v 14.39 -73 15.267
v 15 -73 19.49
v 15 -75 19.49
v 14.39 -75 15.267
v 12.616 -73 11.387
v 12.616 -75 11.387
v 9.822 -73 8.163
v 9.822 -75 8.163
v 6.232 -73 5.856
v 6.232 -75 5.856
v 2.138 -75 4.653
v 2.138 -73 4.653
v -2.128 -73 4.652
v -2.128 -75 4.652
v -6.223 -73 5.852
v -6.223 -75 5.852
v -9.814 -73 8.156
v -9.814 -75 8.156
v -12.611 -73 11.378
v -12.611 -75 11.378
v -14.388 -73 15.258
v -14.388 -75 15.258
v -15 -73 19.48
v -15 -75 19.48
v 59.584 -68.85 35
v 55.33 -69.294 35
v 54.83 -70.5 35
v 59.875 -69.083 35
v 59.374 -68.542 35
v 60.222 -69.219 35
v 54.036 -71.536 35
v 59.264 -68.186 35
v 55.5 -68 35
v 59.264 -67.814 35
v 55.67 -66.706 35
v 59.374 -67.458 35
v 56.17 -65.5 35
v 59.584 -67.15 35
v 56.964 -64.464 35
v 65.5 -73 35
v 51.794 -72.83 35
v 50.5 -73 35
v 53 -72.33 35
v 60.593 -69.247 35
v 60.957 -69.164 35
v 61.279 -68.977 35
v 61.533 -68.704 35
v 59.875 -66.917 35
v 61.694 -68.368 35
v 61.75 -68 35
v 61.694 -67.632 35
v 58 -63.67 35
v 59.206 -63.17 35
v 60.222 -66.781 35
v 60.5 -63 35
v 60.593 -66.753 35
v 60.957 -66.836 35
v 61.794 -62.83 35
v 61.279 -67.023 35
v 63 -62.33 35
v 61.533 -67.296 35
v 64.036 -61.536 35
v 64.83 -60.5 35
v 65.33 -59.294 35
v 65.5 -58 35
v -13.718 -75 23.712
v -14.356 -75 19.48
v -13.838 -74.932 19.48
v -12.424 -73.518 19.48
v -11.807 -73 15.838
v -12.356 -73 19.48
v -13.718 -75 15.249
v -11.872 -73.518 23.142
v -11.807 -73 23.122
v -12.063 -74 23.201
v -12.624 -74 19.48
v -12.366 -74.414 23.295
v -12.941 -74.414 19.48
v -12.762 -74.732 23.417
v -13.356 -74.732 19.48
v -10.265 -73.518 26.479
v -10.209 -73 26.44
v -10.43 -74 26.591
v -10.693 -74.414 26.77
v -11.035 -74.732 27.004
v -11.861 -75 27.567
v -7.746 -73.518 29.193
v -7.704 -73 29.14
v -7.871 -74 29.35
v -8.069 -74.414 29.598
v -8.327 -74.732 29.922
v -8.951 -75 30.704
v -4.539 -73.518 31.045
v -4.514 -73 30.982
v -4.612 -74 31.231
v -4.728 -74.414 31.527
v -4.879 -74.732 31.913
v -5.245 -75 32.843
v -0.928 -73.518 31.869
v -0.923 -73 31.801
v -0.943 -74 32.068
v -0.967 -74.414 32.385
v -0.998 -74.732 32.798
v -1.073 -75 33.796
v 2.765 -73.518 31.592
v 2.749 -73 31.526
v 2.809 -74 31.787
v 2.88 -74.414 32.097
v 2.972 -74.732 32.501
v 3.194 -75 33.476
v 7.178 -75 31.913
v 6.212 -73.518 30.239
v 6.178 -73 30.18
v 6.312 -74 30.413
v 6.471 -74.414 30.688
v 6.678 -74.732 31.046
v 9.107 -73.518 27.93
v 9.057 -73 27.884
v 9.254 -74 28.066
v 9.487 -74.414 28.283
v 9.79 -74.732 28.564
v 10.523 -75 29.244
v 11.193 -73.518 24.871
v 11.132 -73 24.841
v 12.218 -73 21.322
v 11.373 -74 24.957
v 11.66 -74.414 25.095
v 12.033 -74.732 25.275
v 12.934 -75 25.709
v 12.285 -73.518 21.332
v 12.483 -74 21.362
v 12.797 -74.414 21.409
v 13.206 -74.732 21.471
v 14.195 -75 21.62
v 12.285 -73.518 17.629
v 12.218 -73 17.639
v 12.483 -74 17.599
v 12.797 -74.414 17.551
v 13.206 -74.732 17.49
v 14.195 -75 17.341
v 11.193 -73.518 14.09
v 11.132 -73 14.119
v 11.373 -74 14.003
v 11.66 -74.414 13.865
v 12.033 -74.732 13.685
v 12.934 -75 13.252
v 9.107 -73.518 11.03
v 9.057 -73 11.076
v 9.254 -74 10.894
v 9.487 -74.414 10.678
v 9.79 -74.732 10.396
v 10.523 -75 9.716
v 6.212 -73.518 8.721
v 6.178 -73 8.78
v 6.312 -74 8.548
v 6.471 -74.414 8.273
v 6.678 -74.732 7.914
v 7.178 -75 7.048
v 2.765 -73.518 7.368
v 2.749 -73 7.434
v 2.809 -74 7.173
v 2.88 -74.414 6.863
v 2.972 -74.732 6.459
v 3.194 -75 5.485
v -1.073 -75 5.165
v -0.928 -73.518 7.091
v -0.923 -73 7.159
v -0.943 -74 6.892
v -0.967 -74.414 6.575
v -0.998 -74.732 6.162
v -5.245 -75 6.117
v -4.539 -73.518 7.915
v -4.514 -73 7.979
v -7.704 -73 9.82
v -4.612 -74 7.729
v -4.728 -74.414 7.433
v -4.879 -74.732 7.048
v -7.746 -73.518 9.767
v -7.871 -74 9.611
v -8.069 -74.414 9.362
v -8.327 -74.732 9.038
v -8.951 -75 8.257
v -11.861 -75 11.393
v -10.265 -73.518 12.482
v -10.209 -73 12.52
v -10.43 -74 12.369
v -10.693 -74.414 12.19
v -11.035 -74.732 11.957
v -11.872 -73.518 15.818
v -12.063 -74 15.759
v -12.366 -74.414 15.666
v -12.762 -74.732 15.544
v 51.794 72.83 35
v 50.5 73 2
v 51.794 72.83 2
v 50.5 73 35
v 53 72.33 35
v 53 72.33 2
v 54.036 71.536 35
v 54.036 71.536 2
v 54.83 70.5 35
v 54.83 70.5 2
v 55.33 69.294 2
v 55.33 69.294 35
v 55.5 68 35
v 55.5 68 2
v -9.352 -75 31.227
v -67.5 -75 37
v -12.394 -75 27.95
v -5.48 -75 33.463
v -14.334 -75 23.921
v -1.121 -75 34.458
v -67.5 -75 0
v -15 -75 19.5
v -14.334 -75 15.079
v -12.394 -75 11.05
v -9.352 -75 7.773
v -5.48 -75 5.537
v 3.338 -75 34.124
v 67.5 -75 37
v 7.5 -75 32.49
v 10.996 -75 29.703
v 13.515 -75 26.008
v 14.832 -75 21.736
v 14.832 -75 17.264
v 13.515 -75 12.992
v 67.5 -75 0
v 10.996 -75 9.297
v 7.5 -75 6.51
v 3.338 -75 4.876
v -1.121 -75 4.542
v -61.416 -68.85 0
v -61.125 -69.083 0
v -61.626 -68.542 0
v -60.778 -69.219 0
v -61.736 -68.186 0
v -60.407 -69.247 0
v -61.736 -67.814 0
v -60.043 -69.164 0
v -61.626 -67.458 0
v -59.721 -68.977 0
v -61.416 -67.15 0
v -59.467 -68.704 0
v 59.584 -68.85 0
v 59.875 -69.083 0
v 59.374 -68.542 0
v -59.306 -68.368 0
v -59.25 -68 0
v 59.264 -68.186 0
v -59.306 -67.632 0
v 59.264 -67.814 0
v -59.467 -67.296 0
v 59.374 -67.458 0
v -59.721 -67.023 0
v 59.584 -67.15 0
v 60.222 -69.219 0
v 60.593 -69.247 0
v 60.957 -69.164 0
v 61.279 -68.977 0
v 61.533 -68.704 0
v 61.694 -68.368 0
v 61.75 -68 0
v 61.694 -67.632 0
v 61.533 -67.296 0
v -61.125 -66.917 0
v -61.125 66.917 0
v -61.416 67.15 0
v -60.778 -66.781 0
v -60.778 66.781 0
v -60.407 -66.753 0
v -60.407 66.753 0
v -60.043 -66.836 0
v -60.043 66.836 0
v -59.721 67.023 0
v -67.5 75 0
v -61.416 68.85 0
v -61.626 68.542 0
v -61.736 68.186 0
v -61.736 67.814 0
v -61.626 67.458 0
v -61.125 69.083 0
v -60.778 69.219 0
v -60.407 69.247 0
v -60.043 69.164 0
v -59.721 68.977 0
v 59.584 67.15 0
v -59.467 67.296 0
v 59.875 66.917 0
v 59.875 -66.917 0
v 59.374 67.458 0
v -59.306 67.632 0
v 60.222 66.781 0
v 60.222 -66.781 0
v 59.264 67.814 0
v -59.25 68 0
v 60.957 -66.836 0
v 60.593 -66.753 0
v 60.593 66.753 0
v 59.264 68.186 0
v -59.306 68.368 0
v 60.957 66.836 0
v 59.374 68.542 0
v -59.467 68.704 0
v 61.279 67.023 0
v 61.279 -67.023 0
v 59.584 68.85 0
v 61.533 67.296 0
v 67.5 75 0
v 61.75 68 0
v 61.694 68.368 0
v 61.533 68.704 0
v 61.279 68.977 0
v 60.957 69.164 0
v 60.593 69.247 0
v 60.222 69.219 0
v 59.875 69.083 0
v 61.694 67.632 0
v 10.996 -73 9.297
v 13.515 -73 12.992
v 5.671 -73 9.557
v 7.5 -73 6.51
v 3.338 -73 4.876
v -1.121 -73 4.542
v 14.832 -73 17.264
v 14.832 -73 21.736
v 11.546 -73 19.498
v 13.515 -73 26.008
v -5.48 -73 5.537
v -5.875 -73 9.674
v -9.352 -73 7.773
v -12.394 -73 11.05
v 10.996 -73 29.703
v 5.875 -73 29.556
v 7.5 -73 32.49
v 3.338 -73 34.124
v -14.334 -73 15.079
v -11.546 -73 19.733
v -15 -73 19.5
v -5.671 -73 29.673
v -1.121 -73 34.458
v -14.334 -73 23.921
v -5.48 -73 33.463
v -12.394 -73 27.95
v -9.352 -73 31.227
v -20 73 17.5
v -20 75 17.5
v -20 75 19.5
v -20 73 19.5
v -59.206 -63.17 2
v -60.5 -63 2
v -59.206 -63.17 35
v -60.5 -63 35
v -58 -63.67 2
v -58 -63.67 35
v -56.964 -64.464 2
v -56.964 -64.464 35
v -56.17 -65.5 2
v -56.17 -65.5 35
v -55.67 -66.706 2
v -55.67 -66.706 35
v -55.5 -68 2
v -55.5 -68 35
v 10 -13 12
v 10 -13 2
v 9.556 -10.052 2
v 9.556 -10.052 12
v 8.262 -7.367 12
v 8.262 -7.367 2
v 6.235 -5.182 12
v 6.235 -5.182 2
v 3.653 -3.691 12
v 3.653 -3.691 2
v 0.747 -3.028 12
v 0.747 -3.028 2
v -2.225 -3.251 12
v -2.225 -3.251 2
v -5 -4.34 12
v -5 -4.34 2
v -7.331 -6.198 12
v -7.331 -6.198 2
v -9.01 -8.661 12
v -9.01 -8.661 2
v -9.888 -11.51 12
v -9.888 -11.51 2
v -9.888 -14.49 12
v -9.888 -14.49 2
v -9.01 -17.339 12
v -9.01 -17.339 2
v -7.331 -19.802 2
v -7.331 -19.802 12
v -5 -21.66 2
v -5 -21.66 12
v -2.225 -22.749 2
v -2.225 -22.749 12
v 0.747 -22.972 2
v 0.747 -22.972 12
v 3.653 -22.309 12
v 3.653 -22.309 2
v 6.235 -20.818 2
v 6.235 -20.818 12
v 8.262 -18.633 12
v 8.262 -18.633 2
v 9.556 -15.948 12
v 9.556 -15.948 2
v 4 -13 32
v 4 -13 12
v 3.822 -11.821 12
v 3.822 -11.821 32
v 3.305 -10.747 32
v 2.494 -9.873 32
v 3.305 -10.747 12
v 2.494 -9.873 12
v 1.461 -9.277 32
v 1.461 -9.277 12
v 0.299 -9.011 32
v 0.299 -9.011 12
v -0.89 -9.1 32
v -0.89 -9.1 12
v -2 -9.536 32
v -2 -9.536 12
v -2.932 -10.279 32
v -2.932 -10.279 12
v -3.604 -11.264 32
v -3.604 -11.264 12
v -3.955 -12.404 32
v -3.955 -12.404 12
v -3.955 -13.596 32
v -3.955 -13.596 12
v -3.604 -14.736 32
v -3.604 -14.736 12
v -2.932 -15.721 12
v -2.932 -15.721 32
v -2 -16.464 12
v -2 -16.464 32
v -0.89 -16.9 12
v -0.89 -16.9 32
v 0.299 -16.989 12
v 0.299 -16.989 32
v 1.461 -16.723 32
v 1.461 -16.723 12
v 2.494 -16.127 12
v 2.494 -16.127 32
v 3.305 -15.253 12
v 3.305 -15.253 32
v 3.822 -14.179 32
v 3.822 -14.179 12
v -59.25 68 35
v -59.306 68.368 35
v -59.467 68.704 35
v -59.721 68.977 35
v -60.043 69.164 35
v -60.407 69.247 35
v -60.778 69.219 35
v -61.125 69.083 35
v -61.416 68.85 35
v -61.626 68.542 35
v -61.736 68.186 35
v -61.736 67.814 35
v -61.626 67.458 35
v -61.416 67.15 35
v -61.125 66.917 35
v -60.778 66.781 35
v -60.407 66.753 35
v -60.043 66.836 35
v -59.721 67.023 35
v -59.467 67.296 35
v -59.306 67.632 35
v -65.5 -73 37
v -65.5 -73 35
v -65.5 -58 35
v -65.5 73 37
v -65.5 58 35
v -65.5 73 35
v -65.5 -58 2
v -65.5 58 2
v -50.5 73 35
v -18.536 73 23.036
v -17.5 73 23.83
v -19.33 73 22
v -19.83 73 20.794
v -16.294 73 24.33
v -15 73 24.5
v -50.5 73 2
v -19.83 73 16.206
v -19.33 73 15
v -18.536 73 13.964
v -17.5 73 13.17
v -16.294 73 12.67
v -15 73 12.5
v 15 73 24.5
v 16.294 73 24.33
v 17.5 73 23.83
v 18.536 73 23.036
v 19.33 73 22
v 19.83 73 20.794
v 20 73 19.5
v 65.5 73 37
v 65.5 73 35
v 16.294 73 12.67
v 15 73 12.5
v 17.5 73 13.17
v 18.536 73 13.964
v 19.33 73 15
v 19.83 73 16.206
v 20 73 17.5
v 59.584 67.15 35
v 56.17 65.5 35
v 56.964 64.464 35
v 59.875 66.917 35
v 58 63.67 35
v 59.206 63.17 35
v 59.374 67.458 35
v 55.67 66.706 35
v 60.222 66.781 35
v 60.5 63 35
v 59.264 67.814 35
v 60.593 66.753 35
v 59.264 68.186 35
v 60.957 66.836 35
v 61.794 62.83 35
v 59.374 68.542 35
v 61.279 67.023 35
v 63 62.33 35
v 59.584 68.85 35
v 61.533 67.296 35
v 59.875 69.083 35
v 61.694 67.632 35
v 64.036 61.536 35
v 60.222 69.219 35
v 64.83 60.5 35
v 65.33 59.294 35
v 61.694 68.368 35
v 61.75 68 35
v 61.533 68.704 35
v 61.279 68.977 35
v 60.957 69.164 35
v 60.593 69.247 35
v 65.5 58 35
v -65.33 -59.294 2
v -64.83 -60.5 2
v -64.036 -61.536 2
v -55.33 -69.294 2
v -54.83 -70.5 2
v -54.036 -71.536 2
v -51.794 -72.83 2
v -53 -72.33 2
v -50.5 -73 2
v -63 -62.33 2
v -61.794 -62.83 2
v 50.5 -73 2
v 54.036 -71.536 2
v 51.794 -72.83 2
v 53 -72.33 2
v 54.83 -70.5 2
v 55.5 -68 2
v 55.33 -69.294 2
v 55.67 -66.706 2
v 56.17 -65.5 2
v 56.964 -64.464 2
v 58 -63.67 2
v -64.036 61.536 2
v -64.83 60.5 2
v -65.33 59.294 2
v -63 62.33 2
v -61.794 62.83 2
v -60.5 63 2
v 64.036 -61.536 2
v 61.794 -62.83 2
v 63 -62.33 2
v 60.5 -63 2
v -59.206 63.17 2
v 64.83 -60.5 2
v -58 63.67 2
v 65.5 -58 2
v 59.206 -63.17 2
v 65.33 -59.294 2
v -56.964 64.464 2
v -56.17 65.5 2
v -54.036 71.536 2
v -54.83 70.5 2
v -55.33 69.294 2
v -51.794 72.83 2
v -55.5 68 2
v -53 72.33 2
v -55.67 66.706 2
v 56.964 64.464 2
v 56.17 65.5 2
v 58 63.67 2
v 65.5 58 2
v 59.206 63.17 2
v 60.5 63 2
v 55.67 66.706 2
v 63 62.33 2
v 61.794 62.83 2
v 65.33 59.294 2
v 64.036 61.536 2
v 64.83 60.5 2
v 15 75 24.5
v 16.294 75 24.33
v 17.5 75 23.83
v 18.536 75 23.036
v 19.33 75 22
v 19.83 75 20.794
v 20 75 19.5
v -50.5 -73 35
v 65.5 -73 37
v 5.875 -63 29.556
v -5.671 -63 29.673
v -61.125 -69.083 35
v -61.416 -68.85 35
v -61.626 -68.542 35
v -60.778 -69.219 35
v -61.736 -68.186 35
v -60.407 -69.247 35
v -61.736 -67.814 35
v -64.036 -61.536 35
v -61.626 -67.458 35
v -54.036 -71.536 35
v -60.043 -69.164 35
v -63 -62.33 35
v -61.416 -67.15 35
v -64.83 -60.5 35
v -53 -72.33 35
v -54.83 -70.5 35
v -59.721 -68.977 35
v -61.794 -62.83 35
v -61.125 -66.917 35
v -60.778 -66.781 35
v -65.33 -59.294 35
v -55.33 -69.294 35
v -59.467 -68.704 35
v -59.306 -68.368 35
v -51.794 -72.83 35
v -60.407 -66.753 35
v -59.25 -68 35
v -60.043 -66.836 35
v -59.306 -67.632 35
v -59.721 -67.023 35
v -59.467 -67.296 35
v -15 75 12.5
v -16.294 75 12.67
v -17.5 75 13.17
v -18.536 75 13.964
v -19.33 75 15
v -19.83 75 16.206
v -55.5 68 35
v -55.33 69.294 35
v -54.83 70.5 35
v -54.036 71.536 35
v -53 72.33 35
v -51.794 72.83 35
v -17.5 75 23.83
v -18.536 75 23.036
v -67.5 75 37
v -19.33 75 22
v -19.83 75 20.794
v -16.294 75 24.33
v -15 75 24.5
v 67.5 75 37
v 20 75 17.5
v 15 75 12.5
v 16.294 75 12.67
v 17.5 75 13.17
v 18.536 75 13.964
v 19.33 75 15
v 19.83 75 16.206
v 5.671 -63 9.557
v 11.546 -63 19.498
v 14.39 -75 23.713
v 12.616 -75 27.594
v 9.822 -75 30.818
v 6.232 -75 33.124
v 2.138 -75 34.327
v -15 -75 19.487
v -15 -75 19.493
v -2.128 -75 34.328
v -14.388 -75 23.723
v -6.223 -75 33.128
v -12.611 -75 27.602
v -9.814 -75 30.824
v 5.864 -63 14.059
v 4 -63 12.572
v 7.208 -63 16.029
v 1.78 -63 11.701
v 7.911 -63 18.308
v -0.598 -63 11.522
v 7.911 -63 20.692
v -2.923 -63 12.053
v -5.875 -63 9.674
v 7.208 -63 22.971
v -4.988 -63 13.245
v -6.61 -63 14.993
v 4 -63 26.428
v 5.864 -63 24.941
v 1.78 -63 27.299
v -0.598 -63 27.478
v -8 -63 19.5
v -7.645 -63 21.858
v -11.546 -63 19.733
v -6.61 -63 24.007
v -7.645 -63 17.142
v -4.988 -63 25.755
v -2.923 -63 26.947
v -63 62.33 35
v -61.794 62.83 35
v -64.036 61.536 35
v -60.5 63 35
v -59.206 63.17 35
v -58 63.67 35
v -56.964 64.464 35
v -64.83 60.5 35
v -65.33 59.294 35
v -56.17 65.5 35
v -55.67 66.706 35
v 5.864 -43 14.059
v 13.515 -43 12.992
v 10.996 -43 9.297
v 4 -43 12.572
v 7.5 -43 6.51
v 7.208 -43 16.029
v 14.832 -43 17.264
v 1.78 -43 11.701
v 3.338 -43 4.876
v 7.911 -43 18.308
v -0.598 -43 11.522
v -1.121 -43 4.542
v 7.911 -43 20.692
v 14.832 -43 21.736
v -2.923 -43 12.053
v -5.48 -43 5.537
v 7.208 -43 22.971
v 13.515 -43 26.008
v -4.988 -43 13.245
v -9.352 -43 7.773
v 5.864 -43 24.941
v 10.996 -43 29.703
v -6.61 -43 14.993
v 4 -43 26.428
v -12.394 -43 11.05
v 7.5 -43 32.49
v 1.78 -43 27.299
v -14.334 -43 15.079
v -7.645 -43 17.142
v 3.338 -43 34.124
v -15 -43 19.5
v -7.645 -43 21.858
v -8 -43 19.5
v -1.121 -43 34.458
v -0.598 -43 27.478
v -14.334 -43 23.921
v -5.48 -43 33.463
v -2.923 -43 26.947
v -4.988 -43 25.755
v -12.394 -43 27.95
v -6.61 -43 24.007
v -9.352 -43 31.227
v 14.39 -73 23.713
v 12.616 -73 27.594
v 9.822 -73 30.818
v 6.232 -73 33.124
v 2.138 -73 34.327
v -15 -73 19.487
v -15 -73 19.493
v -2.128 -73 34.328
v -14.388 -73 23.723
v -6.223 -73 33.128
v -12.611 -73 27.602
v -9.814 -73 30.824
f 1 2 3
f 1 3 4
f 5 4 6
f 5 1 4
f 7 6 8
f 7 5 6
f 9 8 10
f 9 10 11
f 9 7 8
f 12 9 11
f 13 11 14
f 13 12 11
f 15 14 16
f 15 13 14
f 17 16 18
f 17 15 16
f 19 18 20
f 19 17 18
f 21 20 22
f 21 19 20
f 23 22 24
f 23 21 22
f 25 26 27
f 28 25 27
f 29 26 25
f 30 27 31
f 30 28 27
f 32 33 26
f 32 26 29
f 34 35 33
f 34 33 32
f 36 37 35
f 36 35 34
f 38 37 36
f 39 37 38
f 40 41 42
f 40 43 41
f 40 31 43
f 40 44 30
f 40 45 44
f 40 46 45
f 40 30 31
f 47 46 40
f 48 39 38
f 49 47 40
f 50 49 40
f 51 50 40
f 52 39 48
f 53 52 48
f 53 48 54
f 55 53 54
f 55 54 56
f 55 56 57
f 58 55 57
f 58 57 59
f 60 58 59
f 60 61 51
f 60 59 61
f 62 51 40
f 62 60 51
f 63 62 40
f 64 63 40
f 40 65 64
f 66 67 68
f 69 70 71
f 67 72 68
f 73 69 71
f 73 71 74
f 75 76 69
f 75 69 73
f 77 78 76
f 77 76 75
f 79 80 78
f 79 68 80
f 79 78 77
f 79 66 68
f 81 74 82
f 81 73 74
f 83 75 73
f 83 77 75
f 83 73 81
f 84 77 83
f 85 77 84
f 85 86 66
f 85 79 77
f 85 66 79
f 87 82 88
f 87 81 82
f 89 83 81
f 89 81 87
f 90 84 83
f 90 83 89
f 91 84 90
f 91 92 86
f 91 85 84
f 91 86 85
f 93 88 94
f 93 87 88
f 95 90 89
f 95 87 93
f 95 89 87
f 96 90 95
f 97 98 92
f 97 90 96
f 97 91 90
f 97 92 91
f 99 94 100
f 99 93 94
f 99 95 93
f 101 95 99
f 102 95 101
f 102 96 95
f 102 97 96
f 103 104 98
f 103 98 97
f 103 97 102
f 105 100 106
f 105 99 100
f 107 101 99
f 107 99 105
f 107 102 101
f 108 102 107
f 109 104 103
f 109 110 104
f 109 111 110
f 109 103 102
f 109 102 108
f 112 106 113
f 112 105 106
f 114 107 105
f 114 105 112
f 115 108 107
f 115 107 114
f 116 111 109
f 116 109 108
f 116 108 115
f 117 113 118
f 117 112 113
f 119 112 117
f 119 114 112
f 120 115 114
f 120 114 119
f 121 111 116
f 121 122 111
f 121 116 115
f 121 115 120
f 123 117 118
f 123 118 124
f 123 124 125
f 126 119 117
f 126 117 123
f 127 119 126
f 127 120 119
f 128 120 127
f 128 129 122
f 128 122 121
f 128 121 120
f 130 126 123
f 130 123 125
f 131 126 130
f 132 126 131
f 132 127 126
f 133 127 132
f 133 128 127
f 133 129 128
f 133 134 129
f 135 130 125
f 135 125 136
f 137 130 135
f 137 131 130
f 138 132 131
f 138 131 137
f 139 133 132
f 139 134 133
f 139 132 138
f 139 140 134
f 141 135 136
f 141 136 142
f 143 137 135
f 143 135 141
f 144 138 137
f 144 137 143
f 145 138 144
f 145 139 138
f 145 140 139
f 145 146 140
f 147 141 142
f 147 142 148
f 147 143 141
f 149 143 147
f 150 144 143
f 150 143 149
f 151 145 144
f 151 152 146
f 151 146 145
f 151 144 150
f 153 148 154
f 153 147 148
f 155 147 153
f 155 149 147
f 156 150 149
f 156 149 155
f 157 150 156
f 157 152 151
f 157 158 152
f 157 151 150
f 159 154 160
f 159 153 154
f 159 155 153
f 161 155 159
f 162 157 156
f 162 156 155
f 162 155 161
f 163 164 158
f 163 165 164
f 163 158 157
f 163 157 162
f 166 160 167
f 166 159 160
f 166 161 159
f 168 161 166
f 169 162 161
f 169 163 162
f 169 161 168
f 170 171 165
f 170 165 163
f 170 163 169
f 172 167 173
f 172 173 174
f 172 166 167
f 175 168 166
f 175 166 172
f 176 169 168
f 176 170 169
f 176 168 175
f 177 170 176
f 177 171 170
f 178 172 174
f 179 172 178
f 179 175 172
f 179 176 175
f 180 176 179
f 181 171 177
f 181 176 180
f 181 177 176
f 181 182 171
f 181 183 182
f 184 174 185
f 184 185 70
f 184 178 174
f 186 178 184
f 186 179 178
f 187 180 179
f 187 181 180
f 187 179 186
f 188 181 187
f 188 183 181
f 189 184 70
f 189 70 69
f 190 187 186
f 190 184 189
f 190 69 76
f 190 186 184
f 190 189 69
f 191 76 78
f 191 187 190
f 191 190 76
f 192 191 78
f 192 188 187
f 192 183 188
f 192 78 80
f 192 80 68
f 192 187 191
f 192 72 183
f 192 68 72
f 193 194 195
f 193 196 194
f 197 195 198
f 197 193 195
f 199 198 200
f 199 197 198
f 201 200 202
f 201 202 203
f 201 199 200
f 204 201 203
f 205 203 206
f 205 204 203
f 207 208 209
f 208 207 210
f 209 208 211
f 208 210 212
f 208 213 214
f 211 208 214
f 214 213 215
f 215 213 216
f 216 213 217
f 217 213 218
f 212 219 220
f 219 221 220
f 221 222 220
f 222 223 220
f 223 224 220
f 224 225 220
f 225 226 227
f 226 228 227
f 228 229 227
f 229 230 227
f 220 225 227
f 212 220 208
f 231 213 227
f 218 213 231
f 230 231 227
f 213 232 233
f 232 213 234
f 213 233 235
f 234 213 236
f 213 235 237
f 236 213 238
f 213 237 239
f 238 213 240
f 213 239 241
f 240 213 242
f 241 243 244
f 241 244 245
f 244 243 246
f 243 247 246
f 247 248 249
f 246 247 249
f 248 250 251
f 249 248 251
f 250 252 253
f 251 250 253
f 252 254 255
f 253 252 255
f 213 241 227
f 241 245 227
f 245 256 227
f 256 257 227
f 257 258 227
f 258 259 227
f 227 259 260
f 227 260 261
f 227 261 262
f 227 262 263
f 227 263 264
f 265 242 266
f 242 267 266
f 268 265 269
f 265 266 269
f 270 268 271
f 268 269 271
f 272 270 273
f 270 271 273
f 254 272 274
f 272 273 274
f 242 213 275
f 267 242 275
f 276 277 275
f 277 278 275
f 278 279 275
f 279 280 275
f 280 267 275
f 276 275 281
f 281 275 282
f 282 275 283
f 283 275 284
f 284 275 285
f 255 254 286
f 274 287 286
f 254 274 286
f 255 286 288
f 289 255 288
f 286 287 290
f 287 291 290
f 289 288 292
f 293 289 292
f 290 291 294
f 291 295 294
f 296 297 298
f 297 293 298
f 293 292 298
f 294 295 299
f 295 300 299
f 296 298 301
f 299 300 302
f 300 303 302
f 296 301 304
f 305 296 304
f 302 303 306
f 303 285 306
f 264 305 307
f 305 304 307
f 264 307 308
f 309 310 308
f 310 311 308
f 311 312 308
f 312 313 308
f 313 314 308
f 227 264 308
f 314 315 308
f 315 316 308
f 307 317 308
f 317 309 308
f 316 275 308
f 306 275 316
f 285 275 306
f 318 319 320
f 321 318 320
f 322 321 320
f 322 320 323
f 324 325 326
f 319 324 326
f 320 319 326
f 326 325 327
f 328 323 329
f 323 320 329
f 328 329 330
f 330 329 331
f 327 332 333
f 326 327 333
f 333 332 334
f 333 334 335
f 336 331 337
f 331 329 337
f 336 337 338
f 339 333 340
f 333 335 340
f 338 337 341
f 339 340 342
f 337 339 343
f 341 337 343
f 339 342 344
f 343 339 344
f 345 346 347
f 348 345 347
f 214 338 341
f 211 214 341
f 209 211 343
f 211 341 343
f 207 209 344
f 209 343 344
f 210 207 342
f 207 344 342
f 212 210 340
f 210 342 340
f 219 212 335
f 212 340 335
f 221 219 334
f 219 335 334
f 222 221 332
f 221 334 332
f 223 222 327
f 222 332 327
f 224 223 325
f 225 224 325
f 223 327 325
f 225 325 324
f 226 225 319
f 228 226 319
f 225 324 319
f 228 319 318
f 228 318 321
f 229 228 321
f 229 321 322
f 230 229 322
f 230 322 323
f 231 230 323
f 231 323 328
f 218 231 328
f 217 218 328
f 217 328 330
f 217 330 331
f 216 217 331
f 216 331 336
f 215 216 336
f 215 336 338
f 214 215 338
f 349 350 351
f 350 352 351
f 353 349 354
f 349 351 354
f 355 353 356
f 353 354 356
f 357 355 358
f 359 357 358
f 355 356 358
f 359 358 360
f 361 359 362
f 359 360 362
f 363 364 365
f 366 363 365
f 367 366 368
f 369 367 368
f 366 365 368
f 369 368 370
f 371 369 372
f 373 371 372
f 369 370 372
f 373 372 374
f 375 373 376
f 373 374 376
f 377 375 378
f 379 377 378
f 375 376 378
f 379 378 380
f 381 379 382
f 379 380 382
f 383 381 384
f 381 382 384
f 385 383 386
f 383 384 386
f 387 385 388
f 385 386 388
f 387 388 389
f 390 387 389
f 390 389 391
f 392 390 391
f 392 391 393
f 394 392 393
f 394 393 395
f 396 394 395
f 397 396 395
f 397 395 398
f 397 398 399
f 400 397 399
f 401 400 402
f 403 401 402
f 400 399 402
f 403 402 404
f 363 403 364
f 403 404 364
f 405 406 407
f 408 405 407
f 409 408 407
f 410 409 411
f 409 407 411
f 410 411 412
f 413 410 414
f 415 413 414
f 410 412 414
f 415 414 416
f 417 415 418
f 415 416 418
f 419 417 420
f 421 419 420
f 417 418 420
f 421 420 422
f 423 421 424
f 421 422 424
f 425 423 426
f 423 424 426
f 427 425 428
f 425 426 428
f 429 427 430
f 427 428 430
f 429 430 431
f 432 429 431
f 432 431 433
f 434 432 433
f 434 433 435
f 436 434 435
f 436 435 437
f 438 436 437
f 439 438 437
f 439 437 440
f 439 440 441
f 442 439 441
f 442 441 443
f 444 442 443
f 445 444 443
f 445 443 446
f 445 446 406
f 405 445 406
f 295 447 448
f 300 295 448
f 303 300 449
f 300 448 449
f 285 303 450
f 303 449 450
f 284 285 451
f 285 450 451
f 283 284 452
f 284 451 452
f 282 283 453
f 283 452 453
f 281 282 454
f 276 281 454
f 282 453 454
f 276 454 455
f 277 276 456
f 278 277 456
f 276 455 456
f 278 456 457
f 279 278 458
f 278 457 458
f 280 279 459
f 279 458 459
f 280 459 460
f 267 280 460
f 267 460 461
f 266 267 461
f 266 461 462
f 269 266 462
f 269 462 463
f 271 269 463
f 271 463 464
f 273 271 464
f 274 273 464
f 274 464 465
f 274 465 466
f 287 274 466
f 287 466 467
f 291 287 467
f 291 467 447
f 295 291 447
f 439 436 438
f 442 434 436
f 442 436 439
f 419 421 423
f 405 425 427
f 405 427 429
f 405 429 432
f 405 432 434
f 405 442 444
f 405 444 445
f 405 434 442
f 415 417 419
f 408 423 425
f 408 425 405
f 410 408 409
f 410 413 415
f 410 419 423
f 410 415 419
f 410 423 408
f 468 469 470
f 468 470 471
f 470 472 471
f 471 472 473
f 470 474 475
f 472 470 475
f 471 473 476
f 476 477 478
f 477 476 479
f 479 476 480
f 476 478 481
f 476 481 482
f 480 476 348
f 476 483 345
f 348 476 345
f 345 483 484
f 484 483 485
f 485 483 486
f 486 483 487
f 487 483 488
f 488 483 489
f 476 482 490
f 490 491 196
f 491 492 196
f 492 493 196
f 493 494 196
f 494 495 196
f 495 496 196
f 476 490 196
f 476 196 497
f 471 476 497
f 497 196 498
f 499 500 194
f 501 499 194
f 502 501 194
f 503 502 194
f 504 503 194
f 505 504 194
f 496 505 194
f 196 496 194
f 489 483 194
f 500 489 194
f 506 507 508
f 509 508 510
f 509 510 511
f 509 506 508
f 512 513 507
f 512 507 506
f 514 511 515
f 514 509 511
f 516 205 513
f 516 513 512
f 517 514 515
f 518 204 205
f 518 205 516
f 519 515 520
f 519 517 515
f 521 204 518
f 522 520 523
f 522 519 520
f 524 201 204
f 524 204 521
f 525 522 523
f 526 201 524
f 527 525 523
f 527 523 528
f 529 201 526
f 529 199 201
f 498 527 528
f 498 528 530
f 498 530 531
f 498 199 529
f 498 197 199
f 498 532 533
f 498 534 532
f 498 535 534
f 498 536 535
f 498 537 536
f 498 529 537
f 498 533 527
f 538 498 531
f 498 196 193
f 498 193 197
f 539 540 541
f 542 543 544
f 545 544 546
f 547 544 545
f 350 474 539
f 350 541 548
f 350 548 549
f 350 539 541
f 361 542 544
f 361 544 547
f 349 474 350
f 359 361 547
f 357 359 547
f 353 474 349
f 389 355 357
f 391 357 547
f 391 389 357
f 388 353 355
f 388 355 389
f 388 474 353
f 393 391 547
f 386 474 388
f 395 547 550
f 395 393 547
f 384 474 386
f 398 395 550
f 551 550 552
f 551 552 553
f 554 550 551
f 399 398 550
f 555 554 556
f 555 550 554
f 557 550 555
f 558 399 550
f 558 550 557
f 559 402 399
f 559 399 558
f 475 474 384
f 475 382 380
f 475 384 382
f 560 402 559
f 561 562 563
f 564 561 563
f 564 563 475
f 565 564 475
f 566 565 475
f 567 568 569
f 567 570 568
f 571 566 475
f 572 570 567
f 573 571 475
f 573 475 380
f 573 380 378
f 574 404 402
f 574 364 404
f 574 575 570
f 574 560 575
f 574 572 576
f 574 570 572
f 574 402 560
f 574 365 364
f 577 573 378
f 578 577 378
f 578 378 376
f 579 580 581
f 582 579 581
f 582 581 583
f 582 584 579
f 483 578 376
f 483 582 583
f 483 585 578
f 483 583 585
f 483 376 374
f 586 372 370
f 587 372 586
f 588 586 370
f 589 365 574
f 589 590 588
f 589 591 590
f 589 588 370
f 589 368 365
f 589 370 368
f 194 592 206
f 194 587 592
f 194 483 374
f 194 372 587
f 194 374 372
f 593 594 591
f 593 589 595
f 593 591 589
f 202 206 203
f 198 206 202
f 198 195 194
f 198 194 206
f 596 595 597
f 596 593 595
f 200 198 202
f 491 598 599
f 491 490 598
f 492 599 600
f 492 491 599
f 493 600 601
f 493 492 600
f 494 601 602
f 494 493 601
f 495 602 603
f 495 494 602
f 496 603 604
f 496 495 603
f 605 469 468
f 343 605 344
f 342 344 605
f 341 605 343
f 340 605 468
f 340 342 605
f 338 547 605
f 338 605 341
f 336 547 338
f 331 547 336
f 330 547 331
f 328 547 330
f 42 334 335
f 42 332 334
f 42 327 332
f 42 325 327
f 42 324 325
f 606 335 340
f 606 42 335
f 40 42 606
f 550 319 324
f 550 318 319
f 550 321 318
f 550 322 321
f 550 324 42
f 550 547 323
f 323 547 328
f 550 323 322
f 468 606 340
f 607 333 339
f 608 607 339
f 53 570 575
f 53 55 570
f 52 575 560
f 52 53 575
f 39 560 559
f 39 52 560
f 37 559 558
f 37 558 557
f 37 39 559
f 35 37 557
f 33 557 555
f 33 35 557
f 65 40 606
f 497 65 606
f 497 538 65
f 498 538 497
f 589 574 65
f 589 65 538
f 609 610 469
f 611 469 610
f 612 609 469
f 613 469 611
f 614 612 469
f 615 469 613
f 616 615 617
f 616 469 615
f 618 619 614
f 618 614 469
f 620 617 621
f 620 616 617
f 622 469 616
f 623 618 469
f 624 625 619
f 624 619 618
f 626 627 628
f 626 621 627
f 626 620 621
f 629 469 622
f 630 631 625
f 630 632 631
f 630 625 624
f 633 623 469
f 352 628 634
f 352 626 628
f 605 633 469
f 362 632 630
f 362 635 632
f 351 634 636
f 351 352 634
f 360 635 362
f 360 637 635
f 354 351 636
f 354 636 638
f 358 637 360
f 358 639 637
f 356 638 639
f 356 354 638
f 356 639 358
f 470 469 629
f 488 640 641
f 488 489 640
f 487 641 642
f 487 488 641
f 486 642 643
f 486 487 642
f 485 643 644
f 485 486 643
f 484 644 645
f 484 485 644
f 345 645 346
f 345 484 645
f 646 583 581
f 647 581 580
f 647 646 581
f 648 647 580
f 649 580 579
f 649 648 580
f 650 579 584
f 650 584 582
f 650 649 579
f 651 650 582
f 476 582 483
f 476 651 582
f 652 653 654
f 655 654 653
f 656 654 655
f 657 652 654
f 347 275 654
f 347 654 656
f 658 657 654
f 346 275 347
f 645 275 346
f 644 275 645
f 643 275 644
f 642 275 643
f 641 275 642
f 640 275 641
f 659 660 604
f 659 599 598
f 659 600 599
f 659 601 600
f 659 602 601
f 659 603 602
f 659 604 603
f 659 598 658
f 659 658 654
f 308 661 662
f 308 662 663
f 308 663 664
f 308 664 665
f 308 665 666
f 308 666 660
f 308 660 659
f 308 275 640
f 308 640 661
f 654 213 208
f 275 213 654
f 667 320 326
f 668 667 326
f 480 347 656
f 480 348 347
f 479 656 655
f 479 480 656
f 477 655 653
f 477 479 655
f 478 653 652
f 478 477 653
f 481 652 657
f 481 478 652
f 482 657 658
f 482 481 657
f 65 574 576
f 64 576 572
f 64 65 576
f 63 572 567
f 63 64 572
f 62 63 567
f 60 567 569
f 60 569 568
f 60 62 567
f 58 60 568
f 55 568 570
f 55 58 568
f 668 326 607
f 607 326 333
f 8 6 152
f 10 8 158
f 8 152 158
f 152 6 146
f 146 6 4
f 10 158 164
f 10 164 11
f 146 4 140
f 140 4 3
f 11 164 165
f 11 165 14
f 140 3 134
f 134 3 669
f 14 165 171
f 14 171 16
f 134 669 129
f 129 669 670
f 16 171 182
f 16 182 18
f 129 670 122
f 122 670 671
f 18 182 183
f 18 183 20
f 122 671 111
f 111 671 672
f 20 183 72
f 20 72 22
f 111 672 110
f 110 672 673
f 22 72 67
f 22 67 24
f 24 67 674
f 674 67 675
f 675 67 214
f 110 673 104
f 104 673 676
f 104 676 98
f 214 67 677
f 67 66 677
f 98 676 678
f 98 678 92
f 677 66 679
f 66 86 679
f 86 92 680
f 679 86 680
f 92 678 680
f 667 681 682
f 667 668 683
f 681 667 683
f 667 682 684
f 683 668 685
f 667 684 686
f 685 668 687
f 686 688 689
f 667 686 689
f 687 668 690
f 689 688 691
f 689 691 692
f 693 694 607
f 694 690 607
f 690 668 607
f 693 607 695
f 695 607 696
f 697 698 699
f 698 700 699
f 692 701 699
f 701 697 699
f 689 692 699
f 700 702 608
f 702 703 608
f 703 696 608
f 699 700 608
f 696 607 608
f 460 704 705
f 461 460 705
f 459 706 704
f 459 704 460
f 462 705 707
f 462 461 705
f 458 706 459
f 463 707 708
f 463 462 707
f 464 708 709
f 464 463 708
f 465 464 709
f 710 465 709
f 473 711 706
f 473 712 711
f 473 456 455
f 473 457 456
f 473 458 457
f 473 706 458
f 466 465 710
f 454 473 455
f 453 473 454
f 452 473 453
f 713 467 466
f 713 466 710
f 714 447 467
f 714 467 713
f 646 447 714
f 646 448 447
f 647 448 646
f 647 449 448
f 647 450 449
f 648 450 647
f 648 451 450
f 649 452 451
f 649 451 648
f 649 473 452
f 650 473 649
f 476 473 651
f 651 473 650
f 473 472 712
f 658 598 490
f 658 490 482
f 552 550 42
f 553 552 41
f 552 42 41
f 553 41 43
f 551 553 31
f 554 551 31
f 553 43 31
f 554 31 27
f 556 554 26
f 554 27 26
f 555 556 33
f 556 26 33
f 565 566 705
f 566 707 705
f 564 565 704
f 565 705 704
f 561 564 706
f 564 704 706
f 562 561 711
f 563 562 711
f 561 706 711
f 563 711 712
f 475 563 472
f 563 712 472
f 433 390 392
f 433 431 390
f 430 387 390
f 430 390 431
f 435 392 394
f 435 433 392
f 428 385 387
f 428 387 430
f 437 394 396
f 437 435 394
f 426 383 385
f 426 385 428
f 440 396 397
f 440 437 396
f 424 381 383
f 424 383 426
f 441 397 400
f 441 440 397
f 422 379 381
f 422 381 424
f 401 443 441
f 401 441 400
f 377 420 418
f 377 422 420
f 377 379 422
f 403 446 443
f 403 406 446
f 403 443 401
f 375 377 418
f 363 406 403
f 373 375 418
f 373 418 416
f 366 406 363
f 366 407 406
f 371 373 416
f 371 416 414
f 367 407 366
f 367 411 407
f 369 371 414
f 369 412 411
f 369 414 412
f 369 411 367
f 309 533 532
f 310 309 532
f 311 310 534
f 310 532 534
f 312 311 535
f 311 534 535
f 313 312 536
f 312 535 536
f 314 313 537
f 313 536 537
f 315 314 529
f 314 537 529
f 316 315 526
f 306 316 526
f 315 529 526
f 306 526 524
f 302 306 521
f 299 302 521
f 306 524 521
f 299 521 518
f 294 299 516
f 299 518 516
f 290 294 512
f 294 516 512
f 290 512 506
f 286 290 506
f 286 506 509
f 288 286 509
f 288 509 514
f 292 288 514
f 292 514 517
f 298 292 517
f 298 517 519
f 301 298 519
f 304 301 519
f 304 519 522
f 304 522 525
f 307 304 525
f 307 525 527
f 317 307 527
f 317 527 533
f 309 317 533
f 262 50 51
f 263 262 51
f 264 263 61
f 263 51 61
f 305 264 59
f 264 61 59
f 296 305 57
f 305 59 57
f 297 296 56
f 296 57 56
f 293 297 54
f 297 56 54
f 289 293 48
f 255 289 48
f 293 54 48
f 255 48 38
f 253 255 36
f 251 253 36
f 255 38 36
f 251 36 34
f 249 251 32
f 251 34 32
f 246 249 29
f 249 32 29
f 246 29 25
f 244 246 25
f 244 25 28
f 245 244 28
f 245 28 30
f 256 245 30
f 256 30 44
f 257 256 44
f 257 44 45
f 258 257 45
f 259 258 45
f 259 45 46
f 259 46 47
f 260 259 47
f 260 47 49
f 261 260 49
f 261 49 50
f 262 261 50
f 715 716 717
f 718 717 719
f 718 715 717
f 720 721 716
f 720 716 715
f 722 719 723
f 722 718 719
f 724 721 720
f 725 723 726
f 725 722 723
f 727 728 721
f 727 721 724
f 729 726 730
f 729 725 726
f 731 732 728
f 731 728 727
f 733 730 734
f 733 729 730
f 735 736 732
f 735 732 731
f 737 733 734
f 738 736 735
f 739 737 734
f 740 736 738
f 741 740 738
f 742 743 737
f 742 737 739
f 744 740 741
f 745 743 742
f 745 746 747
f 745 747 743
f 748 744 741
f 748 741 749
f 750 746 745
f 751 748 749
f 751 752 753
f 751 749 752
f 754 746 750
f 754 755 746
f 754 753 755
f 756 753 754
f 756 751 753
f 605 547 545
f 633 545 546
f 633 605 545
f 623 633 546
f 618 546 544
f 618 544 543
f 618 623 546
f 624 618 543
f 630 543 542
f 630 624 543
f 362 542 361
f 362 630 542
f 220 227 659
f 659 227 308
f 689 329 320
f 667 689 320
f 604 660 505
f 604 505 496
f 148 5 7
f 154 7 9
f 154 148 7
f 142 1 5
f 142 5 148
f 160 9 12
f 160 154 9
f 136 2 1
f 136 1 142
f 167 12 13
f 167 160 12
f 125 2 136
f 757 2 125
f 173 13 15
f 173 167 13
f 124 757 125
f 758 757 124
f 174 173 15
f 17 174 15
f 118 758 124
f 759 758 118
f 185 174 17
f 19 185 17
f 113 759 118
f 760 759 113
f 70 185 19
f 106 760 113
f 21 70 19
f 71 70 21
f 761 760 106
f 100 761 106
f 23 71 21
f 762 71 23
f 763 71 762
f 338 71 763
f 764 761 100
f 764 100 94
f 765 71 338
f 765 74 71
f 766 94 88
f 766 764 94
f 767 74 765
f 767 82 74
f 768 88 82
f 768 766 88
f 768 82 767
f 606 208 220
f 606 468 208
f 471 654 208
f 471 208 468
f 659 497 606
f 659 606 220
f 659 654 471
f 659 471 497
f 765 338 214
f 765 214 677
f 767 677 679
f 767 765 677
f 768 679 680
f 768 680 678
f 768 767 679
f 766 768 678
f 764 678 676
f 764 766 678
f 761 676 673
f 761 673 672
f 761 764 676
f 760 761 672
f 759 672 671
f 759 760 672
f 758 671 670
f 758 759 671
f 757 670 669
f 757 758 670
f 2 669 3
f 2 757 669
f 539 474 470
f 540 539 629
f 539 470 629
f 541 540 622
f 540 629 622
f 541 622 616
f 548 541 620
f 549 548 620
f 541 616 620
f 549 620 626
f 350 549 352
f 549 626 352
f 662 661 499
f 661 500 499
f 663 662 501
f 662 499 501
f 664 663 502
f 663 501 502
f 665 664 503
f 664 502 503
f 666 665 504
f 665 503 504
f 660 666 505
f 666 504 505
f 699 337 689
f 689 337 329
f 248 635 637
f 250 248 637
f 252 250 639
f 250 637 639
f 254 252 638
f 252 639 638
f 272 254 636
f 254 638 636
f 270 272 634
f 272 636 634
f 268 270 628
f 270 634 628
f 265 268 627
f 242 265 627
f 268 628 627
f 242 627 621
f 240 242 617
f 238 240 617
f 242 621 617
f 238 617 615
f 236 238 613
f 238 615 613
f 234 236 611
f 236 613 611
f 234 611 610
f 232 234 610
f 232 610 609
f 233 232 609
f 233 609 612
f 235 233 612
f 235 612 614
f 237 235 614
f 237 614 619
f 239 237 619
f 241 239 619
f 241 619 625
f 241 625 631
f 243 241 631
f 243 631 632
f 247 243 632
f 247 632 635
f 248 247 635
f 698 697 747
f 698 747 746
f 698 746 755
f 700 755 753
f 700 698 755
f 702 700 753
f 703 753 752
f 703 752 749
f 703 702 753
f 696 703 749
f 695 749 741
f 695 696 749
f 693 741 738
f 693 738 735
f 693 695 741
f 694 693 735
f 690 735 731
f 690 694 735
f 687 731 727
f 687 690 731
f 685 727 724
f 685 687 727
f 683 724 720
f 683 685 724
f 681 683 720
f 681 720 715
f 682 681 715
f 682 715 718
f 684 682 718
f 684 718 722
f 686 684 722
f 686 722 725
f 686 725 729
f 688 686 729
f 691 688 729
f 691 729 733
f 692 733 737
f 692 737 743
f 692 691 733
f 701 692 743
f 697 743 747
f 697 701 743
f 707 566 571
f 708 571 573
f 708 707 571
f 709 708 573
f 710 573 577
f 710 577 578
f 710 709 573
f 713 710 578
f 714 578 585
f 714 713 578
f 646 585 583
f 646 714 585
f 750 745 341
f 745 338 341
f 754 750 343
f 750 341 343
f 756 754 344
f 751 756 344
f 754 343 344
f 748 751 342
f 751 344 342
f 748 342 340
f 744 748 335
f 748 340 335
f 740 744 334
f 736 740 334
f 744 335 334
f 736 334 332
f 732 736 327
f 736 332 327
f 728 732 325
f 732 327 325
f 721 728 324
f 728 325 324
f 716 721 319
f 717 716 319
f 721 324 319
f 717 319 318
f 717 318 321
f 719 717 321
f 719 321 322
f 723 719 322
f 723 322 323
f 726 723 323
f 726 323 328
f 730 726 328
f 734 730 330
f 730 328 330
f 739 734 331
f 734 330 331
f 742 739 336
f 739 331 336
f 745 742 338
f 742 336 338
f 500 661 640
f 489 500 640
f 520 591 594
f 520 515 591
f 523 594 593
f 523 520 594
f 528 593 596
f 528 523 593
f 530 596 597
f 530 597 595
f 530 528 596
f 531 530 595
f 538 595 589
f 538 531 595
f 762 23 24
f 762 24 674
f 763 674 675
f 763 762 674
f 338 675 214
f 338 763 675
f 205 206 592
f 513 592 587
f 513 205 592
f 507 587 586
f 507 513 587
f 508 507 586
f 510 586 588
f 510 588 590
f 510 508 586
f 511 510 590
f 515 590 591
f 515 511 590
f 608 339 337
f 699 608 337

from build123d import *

# Parameters (mm, degrees)
F0_W      = 135
F0_H      = 150
F1_DEPTH  = 2
F2_W      = 135
F2_H      = 150
F2_W_2    = 131
F2_H_2    = 146
F3_DEPTH  = 35
F4_R      = 4
F5_DEPTH  = 30
F6_R      = 10
F6_R_2    = 4
F7_DEPTH  = 10
F9_R      = 15
F10_DEPTH = 10
F8_R      = 15
F12_DEPTH = 5
F13_R     = 15
F13_R_2   = 8
F14_DEPTH = 20
F15_W     = 40
F15_H     = 12
F16_DEPTH = 2
F17_R     = 5
F18_W     = 10
F18_H     = 10
F19_DEPTH = 33
F20_R     = 1.25
F21_DEPTH = 35.001
F22_R     = 4.99999
F23_R     = 12.3556147712
F24_DEPTH = 2
F25_R     = 1.99999


# Not quite as in the source:
# - a fillet or chamfer is up to 0.001 mm smaller than in the source, because OpenCascade refuses the exact size
# - ends of sketch curves that miss each other by under 0.0002 mm in the source are joined
# - a feature of the source that left no trace in its solid (it failed there, or was rolled back) is left out


with BuildPart() as f1:
    # F0 (on Top) → F1 (new body)
    with BuildSketch(Plane.XY):
        Rectangle(F0_W, F0_H)
    extrude(amount=F1_DEPTH)

    # F2 (on face) → F3 (join)
    with BuildSketch(Plane.XY.offset(2)):
        Rectangle(F2_W, F2_H)
        Rectangle(F2_W_2, F2_H_2, mode=Mode.SUBTRACT)
    extrude(amount=F3_DEPTH)

    # F4 (on face) → F5 (join)
    with BuildSketch(Plane.XY.offset(2)):
        with Locations((0, -13)):
            Circle(F4_R)
    extrude(amount=F5_DEPTH)

    # F6 (on face) → F7 (join)
    with BuildSketch(Plane.XY.offset(2)):
        with Locations((0, -13)):
            Circle(F6_R)
        with Locations((0, -13)):
            Circle(F6_R_2, mode=Mode.SUBTRACT)
    extrude(amount=F7_DEPTH)

    # F8 (on face) → F12 (cut)
    with BuildSketch(Plane(origin=(0, -73, 0), x_dir=(-1, 0, 0), z_dir=(0, 1, 0))):
        with Locations((0, 19.5)):
            Circle(F8_R)
    extrude(amount=-F12_DEPTH, mode=Mode.SUBTRACT)

    # F15 (on face) → F16 (cut)
    with BuildSketch(Plane(origin=(0, 75, 0), x_dir=(-1, 0, 0), z_dir=(0, 1, 0))):
        with Locations((0, 18.5)):
            Rectangle(F15_W, F15_H)
    extrude(amount=-F16_DEPTH, mode=Mode.SUBTRACT)

    # F17
    f17_edges = [f1.edges().sort_by_distance(p)[0] for p in [
        (-20, 74, 12.5),
        (20, 74, 12.5),
        (-20, 74, 24.5),
        (20, 74, 24.5),
    ]]
    fillet(f17_edges, radius=F17_R)

    # F18 (on face) → F19 (join)
    with BuildSketch(Plane.XY.offset(2)):
        with Locations((-60.5, 68)):
            Rectangle(F18_W, F18_H)
        with Locations((60.5, 68)):
            Rectangle(F18_W, F18_H)
        with Locations((60.5, -68)):
            Rectangle(F18_W, F18_H)
        with Locations((-60.5, -68)):
            Rectangle(F18_W, F18_H)
    extrude(amount=F19_DEPTH)

    # F20 (on face) → F21 (cut, through all)
    with BuildSketch(Plane.XY.offset(35)):
        with Locations((-60.5, 68)):
            Circle(F20_R)
        with Locations((60.5, 68)):
            Circle(F20_R)
        with Locations((60.5, -68)):
            Circle(F20_R)
        with Locations((-60.5, -68)):
            Circle(F20_R)
    extrude(amount=-F21_DEPTH, mode=Mode.SUBTRACT)

    # F22 (radius 5 in the source; OpenCascade refuses exactly that, so slightly less here)
    f22_edges = [f1.edges().sort_by_distance(p)[0] for p in [
        (-55.5, 73, 18.5),
        (-55.5, 63, 18.5),
        (-65.5, 63, 18.5),
        (55.5, 73, 18.5),
        (55.5, 63, 18.5),
        (65.5, 63, 18.5),
        (65.5, -63, 18.5),
        (55.5, -63, 18.5),
        (55.5, -73, 18.5),
        (-65.5, -63, 18.5),
        (-55.5, -63, 18.5),
        (-55.5, -73, 18.5),
    ]]
    fillet(f22_edges, radius=F22_R)


with BuildPart() as f10:
    # F9 (on face) → F10 (new body)
    with BuildSketch(Plane(origin=(0, -73, 0), x_dir=(-1, 0, 0), z_dir=(0, 1, 0))):
        with Locations((0, 19.5)):
            Circle(F9_R)
        Polygon((5.6714946114, 29.6733575716), (11.5464081104, 19.7325968002), (5.874913499, 9.6743920794), (-5.6714946114, 9.5569481299), (-11.5464081104, 19.4977089013), (-5.874913499, 29.5559136221), align=None, mode=Mode.SUBTRACT)
    extrude(amount=F10_DEPTH)

    # F13 (on face) → F14 (join)
    with BuildSketch(Plane(origin=(0, -63, 0), x_dir=(-1, 0, 0), z_dir=(0, 1, 0))):
        with Locations((0, 19.5)):
            Circle(F13_R)
        Polygon((-5.874913499, 29.5559136221), (5.6714946114, 29.6733575716), (11.5464081104, 19.7325968002), (5.874913499, 9.6743920794), (-5.6714946114, 9.5569481299), (-11.5464081104, 19.4977089013), align=None, mode=Mode.SUBTRACT)
        Polygon((11.5464081104, 19.7325968002), (5.6714946114, 29.6733575716), (-5.874913499, 29.5559136221), (-11.5464081104, 19.4977089013), (-5.6714946114, 9.5569481299), (5.874913499, 9.6743920794), align=None)
        with Locations((0, 19.5)):
            Circle(F13_R_2, mode=Mode.SUBTRACT)
    extrude(amount=F14_DEPTH)


with BuildPart() as f24:
    # F23 (on face) → F24 (new body)
    with BuildSketch(Plane(origin=(0, -73, 0), x_dir=(-1, 0, 0), z_dir=(0, 1, 0))):
        with BuildLine():
            ThreePointArc((-14.9999967303, 19.4900959839), (-0.0049520018, 4.5000008174), (14.9999869214, 19.4801919852))
            ThreePointArc((14.9999869214, 19.4801919852), (14.9999967304, 19.4900959775), (14.9999869214, 19.4999999827))
            ThreePointArc((14.9999869214, 19.4999999827), (-0.0049520018, 34.4801911505), (-14.9999967303, 19.4900959839))
        make_face()
        with Locations((0, 19.4801919679)):
            Circle(F23_R, mode=Mode.SUBTRACT)
    extrude(amount=-F24_DEPTH)

    # F25 (radius 2 in the source; OpenCascade refuses exactly that, so slightly less here)
    f25_edges = [f24.edges().sort_by_distance(p)[0] for p in [
        (12.355615, -75, 19.480192),
    ]]
    fillet(f25_edges, radius=F25_R)


solid = Compound([f1.part, f10.part, f24.part])
